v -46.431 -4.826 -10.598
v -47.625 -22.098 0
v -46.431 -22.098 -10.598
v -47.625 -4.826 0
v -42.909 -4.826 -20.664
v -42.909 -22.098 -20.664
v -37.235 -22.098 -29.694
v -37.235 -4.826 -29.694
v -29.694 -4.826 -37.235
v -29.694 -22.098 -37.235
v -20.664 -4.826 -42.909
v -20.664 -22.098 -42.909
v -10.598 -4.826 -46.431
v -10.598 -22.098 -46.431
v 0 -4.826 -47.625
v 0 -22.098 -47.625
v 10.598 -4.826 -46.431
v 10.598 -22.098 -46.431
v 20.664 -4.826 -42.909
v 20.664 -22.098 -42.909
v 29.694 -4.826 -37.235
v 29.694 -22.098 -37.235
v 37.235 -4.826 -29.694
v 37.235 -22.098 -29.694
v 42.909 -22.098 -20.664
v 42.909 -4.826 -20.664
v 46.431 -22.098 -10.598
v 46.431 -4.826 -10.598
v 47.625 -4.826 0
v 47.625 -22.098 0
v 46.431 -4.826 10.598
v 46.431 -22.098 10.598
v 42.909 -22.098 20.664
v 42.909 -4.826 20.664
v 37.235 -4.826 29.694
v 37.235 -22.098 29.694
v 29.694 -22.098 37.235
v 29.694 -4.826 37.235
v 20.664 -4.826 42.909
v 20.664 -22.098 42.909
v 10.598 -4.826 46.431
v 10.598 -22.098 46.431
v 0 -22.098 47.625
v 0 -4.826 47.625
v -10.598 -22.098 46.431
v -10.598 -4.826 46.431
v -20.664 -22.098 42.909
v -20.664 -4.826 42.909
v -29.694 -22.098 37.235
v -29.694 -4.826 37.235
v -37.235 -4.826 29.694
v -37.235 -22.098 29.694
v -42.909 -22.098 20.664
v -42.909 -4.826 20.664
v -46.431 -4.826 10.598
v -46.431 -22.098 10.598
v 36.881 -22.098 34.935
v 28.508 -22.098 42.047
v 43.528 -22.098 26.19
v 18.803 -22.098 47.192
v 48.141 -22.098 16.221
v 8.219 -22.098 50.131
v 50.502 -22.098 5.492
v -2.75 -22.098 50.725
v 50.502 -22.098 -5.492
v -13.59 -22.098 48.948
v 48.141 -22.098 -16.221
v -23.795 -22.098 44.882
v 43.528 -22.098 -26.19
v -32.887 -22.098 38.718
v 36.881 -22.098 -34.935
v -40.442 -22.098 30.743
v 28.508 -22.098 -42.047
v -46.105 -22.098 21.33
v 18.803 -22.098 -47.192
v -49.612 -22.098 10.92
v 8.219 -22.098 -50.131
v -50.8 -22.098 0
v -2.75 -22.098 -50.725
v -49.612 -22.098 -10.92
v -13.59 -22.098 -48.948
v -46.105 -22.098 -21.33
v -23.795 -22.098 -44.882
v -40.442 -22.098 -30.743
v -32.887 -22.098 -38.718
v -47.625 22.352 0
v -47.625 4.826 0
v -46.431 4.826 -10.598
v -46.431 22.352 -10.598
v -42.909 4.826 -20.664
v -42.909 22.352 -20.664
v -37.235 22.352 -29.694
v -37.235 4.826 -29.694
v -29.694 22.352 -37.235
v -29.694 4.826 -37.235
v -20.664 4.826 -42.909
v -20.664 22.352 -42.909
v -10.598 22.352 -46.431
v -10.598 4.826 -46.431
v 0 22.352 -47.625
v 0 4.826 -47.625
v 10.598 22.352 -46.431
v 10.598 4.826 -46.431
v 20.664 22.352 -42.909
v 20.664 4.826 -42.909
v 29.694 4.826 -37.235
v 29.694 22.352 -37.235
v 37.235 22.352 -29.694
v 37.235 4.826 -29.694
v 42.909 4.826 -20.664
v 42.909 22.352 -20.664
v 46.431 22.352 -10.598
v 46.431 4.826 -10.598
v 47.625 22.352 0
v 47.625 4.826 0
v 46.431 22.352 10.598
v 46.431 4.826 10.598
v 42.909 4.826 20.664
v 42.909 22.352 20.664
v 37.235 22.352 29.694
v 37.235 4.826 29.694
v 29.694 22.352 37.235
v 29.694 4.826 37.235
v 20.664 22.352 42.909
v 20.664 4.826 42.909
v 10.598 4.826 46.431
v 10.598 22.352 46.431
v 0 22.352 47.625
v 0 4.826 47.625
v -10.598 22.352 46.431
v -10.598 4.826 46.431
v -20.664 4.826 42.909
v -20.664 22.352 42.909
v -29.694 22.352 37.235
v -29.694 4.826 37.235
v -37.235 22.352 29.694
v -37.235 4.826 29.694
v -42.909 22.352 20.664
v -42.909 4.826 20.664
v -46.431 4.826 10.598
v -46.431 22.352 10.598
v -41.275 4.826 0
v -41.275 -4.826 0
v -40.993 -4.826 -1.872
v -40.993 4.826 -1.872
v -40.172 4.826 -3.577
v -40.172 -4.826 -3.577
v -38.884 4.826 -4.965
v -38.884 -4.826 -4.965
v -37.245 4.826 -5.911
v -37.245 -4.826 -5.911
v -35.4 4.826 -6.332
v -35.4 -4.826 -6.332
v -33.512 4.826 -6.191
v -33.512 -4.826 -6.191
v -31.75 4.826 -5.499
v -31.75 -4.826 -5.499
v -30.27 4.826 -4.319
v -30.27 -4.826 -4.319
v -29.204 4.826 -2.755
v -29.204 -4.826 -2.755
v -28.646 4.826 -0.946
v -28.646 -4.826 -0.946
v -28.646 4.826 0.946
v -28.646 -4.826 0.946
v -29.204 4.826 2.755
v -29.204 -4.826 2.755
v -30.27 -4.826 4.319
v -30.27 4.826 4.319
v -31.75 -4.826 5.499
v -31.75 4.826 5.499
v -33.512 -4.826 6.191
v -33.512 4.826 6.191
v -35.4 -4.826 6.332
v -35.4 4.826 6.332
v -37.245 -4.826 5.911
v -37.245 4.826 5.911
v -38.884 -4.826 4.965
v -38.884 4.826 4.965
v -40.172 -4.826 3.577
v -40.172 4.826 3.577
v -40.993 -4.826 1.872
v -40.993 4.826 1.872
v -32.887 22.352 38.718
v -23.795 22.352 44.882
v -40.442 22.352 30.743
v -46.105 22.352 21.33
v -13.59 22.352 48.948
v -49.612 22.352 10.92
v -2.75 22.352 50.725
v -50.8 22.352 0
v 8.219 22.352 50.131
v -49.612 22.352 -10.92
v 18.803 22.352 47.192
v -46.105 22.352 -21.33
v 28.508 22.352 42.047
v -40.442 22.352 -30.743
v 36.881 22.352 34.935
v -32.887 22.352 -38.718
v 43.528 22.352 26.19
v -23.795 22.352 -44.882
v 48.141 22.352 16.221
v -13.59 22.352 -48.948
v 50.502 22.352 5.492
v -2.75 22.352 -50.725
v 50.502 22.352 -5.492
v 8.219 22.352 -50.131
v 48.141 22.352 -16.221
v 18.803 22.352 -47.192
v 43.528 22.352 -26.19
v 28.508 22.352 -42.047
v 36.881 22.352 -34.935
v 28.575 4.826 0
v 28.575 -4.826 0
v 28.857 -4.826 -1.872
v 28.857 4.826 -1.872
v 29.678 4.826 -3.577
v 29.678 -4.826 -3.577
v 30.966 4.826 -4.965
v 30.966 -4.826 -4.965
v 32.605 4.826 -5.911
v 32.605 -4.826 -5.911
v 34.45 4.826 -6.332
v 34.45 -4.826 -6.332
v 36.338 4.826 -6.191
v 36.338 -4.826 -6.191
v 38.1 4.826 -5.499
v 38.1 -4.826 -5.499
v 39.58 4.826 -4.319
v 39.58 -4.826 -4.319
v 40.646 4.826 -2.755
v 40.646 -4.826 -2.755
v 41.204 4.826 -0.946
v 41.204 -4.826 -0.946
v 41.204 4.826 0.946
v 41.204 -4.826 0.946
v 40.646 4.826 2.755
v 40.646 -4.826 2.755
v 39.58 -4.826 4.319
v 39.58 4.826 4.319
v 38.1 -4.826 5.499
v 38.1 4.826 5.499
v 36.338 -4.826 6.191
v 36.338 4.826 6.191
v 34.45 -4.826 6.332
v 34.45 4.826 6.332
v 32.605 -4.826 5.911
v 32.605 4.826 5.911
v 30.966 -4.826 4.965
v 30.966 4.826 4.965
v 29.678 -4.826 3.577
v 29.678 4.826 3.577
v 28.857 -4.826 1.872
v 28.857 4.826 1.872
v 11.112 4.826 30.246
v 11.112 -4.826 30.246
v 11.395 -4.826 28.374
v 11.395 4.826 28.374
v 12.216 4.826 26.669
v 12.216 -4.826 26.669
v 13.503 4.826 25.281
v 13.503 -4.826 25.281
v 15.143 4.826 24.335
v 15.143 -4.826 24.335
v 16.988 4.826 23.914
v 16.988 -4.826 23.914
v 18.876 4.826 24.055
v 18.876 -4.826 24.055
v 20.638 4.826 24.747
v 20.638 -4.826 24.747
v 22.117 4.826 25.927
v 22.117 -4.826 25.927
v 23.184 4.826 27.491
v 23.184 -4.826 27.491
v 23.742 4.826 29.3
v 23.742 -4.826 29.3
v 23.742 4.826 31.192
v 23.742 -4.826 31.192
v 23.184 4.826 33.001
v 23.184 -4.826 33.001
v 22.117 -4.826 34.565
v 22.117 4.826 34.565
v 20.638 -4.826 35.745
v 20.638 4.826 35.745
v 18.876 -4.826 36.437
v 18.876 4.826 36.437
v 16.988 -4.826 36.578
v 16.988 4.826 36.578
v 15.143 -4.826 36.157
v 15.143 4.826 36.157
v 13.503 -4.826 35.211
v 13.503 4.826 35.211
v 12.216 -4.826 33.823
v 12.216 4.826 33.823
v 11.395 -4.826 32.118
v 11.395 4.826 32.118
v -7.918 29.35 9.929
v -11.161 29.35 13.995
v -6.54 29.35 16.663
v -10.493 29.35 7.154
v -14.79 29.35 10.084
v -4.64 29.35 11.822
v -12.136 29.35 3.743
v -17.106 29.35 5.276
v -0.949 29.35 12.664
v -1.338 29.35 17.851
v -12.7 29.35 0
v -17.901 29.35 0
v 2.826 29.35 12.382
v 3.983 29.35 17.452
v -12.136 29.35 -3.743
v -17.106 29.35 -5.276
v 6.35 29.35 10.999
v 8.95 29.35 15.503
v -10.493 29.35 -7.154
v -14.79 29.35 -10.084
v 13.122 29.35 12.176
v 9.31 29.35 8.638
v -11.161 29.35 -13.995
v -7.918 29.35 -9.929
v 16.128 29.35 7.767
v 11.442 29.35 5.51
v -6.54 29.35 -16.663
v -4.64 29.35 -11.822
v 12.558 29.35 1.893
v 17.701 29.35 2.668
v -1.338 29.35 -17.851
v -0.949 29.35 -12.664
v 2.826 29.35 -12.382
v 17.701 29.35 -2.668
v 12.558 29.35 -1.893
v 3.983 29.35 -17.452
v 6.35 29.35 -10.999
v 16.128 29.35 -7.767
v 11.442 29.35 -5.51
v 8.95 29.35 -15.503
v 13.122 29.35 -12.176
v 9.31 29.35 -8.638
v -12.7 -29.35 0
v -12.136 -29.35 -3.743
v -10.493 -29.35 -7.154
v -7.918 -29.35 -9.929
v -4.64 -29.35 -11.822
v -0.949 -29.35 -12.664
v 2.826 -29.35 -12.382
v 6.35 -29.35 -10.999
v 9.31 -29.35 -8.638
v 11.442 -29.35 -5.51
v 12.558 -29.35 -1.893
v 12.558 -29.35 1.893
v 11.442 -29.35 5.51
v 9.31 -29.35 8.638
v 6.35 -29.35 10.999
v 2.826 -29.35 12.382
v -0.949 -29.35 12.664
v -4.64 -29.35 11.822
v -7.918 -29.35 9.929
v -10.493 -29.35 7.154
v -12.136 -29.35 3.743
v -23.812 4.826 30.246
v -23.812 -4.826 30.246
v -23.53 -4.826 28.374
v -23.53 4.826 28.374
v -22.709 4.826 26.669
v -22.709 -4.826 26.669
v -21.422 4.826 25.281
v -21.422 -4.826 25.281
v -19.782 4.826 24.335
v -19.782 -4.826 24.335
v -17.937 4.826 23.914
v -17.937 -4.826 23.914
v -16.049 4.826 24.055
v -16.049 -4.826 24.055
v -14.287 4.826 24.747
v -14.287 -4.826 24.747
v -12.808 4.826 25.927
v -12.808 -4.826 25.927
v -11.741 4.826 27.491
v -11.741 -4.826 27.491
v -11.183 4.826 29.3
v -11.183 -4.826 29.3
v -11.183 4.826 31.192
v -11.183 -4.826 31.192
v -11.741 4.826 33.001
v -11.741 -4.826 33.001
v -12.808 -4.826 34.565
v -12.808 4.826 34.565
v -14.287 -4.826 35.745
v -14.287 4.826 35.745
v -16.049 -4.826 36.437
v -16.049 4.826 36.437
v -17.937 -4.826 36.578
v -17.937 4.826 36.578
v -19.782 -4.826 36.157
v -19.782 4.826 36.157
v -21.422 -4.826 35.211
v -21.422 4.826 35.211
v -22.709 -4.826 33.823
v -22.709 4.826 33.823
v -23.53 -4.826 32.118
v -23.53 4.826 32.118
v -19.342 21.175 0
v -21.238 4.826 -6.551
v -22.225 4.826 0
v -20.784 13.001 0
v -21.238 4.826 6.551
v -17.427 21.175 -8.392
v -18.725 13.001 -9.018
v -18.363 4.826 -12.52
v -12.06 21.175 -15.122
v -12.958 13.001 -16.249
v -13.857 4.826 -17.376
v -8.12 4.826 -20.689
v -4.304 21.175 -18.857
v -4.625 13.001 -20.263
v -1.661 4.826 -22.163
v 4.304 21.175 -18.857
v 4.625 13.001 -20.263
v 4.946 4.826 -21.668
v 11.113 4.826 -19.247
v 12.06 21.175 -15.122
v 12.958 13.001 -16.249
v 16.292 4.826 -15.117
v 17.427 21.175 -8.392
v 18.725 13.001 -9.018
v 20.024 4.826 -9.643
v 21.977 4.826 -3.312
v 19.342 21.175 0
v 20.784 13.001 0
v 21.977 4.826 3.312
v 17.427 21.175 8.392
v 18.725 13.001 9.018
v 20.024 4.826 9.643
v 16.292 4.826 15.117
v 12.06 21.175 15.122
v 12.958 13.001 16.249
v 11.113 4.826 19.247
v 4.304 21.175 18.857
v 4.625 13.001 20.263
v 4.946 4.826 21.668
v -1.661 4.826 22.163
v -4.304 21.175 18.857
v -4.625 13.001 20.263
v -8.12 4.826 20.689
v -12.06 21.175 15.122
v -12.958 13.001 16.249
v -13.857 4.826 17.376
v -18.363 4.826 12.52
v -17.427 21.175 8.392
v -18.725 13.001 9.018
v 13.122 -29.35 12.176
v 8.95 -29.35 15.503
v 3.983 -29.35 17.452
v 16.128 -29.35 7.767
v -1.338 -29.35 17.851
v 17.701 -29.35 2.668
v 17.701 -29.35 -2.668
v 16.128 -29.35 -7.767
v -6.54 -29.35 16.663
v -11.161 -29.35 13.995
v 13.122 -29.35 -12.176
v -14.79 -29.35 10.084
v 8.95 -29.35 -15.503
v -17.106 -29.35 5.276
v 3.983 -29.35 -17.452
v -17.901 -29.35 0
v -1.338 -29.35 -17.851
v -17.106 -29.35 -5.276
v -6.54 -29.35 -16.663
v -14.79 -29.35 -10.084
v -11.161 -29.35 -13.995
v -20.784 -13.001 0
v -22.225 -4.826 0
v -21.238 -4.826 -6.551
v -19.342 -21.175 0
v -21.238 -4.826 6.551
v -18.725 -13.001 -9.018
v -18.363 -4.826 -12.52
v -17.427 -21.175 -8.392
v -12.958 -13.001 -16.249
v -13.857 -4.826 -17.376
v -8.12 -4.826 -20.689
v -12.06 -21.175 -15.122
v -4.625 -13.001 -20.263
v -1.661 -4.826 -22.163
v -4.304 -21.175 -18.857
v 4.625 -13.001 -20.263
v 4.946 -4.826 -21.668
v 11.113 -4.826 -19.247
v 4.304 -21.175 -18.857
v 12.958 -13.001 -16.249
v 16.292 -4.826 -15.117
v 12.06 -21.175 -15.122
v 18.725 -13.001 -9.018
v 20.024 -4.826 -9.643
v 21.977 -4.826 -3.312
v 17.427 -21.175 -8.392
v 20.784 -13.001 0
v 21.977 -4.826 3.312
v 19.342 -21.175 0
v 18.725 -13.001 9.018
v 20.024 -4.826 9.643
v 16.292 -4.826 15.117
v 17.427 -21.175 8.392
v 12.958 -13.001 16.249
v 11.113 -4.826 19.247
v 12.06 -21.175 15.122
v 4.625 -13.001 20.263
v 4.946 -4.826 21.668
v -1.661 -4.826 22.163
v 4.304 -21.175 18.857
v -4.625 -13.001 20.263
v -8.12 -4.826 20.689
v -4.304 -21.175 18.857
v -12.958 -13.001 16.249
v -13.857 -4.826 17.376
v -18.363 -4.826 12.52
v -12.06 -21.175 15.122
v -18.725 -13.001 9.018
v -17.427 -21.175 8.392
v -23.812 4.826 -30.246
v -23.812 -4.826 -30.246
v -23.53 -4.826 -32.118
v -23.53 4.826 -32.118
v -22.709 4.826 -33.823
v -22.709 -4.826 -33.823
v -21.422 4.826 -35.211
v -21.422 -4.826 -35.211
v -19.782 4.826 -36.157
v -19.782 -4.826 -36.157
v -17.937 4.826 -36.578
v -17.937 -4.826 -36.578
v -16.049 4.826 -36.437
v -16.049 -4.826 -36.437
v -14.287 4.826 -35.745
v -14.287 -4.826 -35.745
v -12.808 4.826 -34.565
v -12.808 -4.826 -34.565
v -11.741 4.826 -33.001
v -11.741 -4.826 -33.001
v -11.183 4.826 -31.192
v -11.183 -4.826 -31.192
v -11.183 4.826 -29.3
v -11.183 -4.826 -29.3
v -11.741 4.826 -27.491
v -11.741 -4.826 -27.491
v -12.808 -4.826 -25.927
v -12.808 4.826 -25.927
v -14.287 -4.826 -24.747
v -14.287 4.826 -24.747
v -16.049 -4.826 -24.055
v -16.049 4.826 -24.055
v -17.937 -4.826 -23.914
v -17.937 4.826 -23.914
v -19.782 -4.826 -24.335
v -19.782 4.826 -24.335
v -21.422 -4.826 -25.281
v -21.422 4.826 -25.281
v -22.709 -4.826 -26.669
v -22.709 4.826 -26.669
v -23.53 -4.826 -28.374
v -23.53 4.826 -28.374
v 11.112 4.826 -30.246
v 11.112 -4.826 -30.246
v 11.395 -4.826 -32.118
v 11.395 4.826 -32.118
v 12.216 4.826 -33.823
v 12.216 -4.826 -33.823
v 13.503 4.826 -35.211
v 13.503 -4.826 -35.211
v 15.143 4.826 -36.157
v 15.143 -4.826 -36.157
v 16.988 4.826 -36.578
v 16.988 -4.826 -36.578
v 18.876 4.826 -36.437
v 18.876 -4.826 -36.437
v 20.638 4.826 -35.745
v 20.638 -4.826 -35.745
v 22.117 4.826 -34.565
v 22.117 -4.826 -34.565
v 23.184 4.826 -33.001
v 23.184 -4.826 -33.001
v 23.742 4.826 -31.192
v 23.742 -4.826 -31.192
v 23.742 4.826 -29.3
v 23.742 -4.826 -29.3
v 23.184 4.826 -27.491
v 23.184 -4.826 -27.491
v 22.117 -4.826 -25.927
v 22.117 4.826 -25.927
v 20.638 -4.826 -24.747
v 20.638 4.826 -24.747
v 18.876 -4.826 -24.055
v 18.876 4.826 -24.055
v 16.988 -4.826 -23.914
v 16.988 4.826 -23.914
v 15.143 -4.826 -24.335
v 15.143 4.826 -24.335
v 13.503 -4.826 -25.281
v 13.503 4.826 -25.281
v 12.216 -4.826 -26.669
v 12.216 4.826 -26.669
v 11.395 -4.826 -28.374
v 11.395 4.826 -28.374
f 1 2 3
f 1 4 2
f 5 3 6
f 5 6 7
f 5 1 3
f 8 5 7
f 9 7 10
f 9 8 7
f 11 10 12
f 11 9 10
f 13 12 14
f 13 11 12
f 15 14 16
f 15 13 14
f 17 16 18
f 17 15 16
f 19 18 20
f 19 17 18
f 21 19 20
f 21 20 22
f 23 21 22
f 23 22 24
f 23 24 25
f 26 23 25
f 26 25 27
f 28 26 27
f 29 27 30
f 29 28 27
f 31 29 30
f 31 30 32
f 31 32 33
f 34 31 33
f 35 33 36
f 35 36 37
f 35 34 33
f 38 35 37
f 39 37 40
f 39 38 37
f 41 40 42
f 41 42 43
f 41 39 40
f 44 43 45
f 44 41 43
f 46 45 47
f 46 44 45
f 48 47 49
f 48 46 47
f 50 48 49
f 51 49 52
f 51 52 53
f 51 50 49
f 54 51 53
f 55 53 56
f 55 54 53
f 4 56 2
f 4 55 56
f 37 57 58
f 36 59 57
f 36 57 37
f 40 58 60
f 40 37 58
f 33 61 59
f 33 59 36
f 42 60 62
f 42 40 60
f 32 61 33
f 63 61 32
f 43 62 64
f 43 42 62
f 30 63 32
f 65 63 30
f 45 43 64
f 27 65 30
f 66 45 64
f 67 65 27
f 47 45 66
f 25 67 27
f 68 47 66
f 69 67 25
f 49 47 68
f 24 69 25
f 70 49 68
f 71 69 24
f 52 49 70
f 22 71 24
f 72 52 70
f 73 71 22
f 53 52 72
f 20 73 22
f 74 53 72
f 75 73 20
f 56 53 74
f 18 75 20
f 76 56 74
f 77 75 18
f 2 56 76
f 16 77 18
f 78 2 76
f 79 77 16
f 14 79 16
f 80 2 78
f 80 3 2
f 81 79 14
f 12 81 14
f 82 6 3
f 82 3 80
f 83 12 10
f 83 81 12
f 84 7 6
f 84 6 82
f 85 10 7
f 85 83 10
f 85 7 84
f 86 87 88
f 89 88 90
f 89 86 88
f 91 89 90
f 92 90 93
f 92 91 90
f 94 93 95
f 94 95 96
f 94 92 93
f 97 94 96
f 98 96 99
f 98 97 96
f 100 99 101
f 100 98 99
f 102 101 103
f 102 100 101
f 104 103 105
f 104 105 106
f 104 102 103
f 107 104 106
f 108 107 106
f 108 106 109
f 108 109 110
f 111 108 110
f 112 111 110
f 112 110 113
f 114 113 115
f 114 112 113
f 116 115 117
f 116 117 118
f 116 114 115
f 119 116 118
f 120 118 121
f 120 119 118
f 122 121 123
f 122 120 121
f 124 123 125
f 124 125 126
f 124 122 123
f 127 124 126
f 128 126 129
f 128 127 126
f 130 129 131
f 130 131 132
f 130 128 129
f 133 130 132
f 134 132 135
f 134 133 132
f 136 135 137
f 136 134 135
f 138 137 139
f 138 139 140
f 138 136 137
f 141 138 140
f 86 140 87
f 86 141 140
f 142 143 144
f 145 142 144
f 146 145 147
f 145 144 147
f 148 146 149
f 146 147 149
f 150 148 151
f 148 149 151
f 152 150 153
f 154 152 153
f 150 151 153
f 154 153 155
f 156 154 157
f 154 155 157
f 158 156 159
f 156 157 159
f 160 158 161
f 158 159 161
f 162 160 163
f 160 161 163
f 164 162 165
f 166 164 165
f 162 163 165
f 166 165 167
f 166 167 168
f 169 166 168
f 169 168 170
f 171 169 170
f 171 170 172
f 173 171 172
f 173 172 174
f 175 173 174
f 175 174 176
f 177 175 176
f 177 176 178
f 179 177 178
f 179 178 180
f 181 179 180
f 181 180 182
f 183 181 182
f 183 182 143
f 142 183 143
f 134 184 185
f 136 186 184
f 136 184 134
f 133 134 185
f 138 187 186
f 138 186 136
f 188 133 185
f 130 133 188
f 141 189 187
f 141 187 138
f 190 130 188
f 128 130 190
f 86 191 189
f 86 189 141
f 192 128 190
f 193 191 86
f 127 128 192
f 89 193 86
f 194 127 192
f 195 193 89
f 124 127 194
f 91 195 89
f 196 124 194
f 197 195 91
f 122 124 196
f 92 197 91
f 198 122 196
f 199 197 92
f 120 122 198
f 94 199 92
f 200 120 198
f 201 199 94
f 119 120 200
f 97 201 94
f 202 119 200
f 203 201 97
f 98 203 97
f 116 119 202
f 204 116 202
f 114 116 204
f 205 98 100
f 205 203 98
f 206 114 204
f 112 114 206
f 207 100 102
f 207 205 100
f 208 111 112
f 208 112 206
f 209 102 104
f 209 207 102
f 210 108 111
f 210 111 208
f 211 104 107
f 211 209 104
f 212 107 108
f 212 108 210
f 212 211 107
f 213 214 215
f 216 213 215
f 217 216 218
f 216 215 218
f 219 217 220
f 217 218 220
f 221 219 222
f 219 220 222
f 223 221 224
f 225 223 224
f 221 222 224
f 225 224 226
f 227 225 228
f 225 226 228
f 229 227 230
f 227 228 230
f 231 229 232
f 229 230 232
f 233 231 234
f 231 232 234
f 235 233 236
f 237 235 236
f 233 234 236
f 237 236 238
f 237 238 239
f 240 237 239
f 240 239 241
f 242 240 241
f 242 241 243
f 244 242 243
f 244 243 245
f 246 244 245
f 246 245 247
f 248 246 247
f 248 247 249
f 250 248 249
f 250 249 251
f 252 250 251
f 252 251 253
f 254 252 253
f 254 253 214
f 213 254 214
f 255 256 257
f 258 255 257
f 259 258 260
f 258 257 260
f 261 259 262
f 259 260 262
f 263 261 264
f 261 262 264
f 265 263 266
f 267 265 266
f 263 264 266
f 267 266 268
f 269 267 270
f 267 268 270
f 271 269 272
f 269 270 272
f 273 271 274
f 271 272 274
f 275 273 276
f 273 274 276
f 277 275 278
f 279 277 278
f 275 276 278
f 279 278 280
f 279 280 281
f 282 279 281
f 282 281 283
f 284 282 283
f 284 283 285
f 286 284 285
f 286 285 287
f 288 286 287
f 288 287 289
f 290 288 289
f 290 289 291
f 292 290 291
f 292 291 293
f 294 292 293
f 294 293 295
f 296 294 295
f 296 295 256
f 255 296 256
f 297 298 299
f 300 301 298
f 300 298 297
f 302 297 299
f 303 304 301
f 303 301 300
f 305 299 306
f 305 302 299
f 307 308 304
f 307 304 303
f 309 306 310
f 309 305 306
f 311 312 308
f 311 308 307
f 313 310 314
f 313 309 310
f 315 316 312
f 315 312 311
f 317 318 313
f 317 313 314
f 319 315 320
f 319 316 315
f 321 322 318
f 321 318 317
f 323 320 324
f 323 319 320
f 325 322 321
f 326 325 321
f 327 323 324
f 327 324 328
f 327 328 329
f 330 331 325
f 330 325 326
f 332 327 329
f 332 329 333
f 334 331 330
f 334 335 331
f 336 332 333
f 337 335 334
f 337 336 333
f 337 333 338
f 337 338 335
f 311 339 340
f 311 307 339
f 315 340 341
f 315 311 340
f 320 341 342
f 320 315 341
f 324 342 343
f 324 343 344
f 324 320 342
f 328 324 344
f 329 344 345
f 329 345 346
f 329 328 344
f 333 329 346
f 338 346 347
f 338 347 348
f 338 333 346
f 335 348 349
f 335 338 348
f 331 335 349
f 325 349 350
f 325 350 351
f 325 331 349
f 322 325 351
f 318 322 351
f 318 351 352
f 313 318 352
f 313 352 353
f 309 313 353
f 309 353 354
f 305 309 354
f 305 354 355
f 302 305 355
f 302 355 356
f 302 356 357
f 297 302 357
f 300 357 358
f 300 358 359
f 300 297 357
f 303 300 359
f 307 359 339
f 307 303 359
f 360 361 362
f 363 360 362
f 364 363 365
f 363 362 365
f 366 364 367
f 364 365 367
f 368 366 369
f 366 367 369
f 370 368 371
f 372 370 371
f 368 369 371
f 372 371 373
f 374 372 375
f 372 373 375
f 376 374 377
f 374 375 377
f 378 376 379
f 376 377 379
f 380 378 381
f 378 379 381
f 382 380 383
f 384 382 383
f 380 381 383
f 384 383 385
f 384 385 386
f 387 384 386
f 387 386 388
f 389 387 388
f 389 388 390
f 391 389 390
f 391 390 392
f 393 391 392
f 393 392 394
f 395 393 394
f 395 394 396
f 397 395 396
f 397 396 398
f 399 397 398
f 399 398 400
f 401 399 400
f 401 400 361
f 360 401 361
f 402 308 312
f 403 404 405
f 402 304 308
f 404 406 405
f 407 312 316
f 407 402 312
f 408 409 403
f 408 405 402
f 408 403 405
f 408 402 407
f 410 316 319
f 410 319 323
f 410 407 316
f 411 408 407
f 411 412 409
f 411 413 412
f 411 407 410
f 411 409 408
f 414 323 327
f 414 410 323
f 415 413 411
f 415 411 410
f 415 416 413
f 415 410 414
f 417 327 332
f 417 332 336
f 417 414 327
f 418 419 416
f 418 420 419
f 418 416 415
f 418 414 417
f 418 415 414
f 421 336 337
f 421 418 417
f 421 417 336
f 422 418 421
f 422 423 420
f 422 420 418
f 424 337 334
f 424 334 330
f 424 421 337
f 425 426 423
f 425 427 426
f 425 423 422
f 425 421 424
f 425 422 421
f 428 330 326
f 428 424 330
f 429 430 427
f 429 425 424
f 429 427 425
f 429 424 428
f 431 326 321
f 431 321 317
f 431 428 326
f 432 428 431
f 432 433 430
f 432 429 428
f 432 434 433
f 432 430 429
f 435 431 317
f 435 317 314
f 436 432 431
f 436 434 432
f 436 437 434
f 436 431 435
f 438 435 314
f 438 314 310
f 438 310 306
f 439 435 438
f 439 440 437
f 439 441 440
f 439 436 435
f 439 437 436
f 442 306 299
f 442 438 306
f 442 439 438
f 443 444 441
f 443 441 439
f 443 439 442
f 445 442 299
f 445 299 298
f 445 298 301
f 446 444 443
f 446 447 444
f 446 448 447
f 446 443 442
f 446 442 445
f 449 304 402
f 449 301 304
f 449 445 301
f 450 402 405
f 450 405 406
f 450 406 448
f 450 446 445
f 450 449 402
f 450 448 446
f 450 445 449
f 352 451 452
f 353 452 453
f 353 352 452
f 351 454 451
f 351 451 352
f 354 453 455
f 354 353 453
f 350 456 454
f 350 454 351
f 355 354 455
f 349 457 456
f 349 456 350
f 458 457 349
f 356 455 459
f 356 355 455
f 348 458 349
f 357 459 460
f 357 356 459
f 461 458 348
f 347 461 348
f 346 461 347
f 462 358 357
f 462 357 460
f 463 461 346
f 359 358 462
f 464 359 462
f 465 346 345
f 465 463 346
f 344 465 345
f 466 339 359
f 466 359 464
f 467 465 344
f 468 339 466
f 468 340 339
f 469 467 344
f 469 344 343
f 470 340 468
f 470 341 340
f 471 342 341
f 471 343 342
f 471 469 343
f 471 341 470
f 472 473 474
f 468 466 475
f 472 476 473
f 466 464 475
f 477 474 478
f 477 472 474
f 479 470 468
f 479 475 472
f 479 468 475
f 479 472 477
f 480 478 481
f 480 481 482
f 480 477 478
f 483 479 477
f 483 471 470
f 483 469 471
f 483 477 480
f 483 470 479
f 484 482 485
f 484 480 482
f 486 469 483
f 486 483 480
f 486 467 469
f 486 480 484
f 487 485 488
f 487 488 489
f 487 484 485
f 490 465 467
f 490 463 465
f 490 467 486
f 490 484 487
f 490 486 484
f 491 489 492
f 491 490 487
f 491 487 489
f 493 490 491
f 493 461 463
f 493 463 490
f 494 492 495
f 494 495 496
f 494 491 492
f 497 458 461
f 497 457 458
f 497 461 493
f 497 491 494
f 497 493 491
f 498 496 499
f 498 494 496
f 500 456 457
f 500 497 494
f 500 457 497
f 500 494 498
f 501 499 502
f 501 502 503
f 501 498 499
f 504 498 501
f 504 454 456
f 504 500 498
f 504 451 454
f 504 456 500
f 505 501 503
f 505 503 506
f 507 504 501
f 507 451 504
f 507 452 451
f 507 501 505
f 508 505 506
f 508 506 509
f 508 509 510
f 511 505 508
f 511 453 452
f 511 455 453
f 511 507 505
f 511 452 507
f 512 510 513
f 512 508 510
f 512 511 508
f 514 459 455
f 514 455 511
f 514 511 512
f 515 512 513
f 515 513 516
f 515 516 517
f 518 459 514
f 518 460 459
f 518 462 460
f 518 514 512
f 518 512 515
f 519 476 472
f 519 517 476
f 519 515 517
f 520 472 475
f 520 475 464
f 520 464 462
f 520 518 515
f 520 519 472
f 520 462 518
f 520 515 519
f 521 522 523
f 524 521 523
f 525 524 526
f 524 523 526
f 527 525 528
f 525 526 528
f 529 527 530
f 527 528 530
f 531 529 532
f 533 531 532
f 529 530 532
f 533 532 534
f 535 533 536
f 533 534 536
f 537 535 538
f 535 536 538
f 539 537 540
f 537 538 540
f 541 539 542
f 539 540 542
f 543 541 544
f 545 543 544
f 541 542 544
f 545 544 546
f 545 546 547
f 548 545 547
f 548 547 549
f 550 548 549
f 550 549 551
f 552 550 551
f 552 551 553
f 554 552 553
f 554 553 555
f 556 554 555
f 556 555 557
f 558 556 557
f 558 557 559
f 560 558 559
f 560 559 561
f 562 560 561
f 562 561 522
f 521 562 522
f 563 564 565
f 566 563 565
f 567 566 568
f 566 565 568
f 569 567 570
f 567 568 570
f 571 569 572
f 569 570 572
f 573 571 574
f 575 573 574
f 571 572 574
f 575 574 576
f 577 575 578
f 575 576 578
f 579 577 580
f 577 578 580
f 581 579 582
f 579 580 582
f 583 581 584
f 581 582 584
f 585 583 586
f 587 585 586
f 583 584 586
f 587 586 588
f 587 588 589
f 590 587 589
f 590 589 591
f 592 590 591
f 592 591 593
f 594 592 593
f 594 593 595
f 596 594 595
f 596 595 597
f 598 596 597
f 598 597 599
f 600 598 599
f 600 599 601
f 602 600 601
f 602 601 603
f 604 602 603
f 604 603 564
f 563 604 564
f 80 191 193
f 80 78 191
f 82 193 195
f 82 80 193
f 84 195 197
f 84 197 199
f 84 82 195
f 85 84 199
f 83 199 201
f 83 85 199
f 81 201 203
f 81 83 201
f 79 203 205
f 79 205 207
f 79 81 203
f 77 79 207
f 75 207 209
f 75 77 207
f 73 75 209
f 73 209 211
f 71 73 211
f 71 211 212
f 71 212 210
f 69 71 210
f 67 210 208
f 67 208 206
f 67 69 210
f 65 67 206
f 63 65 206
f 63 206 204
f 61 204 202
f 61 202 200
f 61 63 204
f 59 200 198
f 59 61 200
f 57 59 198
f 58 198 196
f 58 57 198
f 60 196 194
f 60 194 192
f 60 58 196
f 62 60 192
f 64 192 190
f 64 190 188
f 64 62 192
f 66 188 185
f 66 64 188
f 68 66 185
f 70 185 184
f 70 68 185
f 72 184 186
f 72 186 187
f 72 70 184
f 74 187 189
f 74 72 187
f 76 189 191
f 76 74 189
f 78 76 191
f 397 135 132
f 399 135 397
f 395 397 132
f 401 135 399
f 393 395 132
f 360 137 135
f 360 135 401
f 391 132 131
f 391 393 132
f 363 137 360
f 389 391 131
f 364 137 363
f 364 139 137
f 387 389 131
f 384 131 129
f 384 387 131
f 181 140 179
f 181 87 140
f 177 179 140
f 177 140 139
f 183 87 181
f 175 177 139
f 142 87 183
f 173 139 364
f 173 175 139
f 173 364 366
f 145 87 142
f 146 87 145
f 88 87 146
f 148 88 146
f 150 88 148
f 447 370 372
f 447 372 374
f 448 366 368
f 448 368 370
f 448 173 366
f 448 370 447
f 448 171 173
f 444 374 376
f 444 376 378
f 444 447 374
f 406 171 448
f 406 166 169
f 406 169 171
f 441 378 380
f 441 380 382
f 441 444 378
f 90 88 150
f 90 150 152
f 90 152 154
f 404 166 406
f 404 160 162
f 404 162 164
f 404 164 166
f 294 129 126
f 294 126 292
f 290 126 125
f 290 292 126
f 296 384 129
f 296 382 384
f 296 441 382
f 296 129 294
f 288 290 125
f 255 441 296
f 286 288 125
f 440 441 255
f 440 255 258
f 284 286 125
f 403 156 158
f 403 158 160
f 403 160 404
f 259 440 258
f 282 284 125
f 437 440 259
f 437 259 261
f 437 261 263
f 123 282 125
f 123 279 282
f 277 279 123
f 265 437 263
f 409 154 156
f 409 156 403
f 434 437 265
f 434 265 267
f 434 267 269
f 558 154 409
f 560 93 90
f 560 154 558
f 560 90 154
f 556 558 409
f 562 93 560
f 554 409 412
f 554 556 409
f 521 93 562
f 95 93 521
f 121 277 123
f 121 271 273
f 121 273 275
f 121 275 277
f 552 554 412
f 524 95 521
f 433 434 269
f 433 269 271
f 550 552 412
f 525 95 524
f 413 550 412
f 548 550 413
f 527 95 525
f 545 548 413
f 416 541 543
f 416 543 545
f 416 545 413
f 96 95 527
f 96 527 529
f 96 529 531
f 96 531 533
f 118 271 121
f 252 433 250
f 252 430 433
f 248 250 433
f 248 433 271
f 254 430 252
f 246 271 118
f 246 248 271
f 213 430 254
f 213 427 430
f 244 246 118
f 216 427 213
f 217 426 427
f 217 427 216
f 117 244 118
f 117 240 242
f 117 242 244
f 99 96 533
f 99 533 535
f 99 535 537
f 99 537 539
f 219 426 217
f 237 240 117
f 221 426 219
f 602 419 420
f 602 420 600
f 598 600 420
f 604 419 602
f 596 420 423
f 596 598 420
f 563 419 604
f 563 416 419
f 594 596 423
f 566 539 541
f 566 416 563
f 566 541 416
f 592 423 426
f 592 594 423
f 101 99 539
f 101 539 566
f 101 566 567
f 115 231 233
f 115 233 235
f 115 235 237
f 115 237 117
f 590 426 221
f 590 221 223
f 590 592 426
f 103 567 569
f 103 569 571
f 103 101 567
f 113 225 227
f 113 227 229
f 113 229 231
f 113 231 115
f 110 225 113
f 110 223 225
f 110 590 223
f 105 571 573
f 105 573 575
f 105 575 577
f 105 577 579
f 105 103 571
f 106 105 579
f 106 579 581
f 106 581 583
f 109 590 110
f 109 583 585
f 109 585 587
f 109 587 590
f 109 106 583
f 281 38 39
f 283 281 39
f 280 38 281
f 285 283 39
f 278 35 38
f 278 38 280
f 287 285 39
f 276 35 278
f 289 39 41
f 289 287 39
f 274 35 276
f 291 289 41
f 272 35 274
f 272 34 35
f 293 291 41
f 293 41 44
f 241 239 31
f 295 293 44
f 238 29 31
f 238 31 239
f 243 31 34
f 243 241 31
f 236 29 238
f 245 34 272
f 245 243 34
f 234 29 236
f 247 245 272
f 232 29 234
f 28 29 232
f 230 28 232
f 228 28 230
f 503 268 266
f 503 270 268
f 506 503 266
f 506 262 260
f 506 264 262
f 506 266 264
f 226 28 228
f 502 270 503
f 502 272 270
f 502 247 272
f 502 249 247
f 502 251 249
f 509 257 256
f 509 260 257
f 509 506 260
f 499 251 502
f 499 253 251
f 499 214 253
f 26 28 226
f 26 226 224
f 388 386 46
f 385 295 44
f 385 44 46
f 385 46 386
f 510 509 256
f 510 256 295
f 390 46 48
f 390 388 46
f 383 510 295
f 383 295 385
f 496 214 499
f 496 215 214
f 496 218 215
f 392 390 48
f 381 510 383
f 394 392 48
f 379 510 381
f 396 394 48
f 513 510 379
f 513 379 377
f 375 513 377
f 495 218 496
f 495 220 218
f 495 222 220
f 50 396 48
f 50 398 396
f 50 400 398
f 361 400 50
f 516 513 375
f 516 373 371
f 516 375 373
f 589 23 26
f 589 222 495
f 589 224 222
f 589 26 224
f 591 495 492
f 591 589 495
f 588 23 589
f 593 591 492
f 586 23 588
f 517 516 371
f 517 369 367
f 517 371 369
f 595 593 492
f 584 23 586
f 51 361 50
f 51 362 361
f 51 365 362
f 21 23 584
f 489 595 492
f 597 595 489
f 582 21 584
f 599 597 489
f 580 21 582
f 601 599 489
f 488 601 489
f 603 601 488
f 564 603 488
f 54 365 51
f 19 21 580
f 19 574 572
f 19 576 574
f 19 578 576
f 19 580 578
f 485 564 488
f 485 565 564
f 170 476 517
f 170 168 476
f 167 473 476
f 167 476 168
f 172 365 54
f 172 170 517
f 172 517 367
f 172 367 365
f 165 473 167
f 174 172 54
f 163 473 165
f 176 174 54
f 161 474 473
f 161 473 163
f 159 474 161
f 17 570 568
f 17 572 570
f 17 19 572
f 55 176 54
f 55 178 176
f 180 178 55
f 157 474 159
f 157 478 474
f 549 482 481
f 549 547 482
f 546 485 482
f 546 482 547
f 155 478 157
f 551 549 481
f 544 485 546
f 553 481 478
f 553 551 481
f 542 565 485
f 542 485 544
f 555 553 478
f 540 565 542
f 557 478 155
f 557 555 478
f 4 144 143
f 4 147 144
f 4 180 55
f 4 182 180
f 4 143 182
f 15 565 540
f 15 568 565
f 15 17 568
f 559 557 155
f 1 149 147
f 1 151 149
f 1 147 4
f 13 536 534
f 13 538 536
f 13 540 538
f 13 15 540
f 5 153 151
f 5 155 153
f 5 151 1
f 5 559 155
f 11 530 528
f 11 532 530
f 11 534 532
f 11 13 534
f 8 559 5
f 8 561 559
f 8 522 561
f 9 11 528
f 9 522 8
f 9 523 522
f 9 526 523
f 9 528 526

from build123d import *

# Parameters (mm, degrees)
F_1_2_0_5_DIAMETER_HOLE1_D = 12.7


with BuildPart() as part:
    # Sketch1 → Revolve1 (revolve)
    with BuildSketch(Plane.XY):
        Polygon((-12.7, 29.3497), (-17.900810023, 29.3497), (-22.225, 4.826), (-47.625, 4.826), (-47.625, 22.352), (-50.8, 22.352), (-50.8, -22.098), (-47.625, -22.098), (-47.625, -4.826), (-22.225, -4.826), (-17.900810023, -29.3497), (-12.7, -29.3497), align=None)
    revolve(axis=Axis((0, 29.3497, 0), (0, -1, 0)))

    # 1/2 (0.5) Diameter Hole1 (through all)
    with Locations(Plane(origin=(0, 4.826, 0), x_dir=(1, 0, 0), z_dir=(0, 1, 0))):
        with Locations((-17.4625, 30.245937227), (17.4625, 30.245937227), (-34.925, 0), (34.925, 0), (-17.4625, -30.245937227), (17.4625, -30.245937227)):
            Hole(F_1_2_0_5_DIAMETER_HOLE1_D / 2)


solid = part.part
